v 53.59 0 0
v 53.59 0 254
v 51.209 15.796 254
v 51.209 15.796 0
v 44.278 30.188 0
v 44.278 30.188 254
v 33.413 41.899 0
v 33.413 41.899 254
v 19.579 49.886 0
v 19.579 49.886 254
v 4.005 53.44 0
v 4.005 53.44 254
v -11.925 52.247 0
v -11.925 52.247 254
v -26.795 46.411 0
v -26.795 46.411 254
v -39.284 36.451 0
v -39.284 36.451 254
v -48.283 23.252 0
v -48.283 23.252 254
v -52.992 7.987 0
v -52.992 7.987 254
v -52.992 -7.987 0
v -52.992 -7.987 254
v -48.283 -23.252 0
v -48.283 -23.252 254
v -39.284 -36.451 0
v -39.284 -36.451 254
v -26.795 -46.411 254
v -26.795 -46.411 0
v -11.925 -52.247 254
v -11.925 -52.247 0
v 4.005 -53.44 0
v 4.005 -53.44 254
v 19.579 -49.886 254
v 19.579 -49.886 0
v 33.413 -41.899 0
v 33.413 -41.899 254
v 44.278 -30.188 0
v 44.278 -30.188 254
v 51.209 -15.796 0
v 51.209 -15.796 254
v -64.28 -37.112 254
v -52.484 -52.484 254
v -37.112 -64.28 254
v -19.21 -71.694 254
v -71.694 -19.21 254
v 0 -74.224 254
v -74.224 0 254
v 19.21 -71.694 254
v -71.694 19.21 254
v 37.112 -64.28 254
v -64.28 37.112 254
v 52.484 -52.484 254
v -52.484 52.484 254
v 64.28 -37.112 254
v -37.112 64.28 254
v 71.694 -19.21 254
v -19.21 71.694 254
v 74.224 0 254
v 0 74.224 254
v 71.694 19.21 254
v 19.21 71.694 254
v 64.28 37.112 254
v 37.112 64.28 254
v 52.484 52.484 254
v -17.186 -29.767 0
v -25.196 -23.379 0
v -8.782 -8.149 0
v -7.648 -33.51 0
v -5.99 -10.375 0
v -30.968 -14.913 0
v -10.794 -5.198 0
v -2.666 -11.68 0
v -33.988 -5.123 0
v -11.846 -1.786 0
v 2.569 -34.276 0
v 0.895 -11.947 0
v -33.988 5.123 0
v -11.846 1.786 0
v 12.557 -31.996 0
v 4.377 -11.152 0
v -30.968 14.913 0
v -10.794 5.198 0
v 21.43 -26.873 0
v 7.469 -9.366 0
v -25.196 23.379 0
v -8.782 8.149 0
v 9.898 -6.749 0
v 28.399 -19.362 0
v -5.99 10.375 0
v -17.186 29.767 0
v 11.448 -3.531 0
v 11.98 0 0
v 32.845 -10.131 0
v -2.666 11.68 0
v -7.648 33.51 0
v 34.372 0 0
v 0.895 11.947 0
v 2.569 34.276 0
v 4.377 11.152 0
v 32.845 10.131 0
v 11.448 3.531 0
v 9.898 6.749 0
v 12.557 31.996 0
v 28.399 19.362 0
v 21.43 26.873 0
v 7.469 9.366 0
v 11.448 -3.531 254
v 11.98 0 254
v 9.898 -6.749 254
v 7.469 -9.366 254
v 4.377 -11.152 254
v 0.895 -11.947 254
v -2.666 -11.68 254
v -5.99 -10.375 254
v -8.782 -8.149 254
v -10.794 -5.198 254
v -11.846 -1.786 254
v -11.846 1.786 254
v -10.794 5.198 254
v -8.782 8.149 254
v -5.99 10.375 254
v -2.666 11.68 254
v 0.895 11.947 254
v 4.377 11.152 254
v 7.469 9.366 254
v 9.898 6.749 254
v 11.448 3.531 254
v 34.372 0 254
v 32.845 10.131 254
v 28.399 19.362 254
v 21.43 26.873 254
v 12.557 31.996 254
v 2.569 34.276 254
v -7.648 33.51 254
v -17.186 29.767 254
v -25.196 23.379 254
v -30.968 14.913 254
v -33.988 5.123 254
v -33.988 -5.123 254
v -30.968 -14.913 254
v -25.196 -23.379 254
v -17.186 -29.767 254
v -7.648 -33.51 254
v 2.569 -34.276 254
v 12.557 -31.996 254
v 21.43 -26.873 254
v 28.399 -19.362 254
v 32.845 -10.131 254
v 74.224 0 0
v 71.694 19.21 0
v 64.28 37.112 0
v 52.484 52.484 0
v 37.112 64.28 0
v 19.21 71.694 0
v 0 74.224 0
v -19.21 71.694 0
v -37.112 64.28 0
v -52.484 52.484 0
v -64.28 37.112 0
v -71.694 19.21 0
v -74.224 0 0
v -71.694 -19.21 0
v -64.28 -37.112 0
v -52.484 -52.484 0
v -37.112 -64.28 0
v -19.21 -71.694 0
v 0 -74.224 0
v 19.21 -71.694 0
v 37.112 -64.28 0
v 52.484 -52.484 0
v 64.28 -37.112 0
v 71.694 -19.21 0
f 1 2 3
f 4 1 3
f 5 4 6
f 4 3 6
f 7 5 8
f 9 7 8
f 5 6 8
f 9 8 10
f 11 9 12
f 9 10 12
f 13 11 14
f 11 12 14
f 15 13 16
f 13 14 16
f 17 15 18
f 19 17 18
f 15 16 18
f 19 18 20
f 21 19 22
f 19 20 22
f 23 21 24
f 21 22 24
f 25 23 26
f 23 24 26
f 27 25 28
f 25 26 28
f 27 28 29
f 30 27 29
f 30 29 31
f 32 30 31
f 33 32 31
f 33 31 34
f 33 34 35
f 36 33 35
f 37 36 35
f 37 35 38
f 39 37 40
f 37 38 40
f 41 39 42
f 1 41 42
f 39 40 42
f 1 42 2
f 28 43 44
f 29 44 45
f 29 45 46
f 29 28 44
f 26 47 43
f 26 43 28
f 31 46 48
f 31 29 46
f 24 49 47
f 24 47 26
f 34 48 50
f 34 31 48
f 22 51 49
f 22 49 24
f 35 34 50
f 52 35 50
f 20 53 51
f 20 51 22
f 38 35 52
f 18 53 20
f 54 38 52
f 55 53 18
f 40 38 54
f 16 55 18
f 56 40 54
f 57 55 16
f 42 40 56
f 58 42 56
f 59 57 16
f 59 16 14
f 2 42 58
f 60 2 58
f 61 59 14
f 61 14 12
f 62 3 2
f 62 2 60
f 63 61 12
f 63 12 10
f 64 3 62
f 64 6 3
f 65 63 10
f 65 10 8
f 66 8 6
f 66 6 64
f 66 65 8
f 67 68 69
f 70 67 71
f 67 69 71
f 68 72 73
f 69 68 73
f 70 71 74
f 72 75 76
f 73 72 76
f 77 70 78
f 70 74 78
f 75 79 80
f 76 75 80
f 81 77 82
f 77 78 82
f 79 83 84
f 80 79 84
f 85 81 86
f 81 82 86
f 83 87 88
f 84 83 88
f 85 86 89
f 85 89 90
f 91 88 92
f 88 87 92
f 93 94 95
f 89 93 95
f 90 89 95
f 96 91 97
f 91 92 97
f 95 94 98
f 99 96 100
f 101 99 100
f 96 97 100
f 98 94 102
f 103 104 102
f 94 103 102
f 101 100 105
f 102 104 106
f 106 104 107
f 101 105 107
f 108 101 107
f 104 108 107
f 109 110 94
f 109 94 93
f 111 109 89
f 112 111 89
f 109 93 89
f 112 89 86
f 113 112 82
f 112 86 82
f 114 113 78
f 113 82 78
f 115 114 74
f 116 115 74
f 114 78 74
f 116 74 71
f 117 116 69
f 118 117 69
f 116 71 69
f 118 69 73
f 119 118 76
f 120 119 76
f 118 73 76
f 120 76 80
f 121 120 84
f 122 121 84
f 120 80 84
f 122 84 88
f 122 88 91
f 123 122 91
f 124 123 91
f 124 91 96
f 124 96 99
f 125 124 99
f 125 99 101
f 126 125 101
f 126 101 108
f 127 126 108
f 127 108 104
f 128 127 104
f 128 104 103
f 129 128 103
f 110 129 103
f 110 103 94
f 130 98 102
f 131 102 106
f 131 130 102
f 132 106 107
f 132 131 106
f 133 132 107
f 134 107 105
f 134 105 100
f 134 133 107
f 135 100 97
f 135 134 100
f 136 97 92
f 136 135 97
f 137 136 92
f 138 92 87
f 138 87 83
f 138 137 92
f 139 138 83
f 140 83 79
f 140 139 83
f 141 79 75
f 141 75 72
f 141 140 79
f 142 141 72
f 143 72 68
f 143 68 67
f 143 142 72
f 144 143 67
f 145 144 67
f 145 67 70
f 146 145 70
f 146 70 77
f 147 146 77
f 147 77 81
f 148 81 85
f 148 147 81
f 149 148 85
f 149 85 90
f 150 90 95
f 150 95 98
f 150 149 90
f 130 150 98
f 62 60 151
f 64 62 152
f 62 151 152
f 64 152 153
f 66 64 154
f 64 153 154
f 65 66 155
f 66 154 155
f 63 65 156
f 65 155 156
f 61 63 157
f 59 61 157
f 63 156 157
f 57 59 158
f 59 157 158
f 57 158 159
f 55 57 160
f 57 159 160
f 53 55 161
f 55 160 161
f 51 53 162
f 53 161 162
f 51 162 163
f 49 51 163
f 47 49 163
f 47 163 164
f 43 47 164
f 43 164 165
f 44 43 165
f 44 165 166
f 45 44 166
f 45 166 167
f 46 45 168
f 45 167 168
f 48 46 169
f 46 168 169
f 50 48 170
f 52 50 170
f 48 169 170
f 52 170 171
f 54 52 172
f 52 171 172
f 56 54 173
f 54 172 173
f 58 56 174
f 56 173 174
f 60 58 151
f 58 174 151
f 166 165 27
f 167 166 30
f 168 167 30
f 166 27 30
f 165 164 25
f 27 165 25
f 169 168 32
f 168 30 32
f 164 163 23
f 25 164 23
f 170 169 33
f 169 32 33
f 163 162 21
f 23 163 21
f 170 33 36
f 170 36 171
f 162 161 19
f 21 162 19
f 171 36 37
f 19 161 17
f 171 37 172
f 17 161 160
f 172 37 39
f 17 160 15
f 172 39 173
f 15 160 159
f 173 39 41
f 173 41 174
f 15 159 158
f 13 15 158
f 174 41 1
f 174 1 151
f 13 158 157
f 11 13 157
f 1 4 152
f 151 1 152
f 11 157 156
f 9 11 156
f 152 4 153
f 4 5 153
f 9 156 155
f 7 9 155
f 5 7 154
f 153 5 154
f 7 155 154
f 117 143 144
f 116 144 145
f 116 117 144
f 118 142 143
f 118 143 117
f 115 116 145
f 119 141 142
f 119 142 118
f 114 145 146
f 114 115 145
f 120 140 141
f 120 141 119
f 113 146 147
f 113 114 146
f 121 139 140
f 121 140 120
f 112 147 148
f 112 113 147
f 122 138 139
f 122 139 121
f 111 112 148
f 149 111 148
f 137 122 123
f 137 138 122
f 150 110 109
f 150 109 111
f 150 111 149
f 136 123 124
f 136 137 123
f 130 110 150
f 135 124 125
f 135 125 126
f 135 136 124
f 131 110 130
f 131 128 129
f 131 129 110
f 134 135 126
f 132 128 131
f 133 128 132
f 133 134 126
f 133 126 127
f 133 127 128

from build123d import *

# Parameters (mm, degrees)
F0_R      = 74.223578
F1_DEPTH  = 254
F2_R      = 11.980086
F3_DEPTH  = 25.4
F3_FACE_R = 11.980086
F4_DEPTH  = 228.6
F5_R      = 53.590302
F5_R_2    = 34.3718
F6_DEPTH  = 254


with BuildPart() as f1:
    # F0 (on Top) → F1 (new body)
    with BuildSketch(Plane.XY):
        Circle(F0_R)
    extrude(amount=F1_DEPTH)

    # F2 (on face) → F3 (cut)
    with BuildSketch(Plane(origin=(0, 0, 0), x_dir=(1, 0, 0), z_dir=(0, 0, -1))):
        Circle(F2_R)
    extrude(amount=-F3_DEPTH, mode=Mode.SUBTRACT)

    # F3_face (on face) → F4 (cut)
    with BuildSketch(Plane(origin=(0, 0, 25.4), x_dir=(1, 0, 0), z_dir=(0, 0, -1))):
        Circle(F3_FACE_R)
    extrude(amount=-F4_DEPTH, mode=Mode.SUBTRACT)

    # F5 (on face) → F6 (cut)
    with BuildSketch(Plane.XY.offset(254)):
        Circle(F5_R)
        Circle(F5_R_2, mode=Mode.SUBTRACT)
    extrude(amount=-F6_DEPTH, mode=Mode.SUBTRACT)


solid = f1.part
